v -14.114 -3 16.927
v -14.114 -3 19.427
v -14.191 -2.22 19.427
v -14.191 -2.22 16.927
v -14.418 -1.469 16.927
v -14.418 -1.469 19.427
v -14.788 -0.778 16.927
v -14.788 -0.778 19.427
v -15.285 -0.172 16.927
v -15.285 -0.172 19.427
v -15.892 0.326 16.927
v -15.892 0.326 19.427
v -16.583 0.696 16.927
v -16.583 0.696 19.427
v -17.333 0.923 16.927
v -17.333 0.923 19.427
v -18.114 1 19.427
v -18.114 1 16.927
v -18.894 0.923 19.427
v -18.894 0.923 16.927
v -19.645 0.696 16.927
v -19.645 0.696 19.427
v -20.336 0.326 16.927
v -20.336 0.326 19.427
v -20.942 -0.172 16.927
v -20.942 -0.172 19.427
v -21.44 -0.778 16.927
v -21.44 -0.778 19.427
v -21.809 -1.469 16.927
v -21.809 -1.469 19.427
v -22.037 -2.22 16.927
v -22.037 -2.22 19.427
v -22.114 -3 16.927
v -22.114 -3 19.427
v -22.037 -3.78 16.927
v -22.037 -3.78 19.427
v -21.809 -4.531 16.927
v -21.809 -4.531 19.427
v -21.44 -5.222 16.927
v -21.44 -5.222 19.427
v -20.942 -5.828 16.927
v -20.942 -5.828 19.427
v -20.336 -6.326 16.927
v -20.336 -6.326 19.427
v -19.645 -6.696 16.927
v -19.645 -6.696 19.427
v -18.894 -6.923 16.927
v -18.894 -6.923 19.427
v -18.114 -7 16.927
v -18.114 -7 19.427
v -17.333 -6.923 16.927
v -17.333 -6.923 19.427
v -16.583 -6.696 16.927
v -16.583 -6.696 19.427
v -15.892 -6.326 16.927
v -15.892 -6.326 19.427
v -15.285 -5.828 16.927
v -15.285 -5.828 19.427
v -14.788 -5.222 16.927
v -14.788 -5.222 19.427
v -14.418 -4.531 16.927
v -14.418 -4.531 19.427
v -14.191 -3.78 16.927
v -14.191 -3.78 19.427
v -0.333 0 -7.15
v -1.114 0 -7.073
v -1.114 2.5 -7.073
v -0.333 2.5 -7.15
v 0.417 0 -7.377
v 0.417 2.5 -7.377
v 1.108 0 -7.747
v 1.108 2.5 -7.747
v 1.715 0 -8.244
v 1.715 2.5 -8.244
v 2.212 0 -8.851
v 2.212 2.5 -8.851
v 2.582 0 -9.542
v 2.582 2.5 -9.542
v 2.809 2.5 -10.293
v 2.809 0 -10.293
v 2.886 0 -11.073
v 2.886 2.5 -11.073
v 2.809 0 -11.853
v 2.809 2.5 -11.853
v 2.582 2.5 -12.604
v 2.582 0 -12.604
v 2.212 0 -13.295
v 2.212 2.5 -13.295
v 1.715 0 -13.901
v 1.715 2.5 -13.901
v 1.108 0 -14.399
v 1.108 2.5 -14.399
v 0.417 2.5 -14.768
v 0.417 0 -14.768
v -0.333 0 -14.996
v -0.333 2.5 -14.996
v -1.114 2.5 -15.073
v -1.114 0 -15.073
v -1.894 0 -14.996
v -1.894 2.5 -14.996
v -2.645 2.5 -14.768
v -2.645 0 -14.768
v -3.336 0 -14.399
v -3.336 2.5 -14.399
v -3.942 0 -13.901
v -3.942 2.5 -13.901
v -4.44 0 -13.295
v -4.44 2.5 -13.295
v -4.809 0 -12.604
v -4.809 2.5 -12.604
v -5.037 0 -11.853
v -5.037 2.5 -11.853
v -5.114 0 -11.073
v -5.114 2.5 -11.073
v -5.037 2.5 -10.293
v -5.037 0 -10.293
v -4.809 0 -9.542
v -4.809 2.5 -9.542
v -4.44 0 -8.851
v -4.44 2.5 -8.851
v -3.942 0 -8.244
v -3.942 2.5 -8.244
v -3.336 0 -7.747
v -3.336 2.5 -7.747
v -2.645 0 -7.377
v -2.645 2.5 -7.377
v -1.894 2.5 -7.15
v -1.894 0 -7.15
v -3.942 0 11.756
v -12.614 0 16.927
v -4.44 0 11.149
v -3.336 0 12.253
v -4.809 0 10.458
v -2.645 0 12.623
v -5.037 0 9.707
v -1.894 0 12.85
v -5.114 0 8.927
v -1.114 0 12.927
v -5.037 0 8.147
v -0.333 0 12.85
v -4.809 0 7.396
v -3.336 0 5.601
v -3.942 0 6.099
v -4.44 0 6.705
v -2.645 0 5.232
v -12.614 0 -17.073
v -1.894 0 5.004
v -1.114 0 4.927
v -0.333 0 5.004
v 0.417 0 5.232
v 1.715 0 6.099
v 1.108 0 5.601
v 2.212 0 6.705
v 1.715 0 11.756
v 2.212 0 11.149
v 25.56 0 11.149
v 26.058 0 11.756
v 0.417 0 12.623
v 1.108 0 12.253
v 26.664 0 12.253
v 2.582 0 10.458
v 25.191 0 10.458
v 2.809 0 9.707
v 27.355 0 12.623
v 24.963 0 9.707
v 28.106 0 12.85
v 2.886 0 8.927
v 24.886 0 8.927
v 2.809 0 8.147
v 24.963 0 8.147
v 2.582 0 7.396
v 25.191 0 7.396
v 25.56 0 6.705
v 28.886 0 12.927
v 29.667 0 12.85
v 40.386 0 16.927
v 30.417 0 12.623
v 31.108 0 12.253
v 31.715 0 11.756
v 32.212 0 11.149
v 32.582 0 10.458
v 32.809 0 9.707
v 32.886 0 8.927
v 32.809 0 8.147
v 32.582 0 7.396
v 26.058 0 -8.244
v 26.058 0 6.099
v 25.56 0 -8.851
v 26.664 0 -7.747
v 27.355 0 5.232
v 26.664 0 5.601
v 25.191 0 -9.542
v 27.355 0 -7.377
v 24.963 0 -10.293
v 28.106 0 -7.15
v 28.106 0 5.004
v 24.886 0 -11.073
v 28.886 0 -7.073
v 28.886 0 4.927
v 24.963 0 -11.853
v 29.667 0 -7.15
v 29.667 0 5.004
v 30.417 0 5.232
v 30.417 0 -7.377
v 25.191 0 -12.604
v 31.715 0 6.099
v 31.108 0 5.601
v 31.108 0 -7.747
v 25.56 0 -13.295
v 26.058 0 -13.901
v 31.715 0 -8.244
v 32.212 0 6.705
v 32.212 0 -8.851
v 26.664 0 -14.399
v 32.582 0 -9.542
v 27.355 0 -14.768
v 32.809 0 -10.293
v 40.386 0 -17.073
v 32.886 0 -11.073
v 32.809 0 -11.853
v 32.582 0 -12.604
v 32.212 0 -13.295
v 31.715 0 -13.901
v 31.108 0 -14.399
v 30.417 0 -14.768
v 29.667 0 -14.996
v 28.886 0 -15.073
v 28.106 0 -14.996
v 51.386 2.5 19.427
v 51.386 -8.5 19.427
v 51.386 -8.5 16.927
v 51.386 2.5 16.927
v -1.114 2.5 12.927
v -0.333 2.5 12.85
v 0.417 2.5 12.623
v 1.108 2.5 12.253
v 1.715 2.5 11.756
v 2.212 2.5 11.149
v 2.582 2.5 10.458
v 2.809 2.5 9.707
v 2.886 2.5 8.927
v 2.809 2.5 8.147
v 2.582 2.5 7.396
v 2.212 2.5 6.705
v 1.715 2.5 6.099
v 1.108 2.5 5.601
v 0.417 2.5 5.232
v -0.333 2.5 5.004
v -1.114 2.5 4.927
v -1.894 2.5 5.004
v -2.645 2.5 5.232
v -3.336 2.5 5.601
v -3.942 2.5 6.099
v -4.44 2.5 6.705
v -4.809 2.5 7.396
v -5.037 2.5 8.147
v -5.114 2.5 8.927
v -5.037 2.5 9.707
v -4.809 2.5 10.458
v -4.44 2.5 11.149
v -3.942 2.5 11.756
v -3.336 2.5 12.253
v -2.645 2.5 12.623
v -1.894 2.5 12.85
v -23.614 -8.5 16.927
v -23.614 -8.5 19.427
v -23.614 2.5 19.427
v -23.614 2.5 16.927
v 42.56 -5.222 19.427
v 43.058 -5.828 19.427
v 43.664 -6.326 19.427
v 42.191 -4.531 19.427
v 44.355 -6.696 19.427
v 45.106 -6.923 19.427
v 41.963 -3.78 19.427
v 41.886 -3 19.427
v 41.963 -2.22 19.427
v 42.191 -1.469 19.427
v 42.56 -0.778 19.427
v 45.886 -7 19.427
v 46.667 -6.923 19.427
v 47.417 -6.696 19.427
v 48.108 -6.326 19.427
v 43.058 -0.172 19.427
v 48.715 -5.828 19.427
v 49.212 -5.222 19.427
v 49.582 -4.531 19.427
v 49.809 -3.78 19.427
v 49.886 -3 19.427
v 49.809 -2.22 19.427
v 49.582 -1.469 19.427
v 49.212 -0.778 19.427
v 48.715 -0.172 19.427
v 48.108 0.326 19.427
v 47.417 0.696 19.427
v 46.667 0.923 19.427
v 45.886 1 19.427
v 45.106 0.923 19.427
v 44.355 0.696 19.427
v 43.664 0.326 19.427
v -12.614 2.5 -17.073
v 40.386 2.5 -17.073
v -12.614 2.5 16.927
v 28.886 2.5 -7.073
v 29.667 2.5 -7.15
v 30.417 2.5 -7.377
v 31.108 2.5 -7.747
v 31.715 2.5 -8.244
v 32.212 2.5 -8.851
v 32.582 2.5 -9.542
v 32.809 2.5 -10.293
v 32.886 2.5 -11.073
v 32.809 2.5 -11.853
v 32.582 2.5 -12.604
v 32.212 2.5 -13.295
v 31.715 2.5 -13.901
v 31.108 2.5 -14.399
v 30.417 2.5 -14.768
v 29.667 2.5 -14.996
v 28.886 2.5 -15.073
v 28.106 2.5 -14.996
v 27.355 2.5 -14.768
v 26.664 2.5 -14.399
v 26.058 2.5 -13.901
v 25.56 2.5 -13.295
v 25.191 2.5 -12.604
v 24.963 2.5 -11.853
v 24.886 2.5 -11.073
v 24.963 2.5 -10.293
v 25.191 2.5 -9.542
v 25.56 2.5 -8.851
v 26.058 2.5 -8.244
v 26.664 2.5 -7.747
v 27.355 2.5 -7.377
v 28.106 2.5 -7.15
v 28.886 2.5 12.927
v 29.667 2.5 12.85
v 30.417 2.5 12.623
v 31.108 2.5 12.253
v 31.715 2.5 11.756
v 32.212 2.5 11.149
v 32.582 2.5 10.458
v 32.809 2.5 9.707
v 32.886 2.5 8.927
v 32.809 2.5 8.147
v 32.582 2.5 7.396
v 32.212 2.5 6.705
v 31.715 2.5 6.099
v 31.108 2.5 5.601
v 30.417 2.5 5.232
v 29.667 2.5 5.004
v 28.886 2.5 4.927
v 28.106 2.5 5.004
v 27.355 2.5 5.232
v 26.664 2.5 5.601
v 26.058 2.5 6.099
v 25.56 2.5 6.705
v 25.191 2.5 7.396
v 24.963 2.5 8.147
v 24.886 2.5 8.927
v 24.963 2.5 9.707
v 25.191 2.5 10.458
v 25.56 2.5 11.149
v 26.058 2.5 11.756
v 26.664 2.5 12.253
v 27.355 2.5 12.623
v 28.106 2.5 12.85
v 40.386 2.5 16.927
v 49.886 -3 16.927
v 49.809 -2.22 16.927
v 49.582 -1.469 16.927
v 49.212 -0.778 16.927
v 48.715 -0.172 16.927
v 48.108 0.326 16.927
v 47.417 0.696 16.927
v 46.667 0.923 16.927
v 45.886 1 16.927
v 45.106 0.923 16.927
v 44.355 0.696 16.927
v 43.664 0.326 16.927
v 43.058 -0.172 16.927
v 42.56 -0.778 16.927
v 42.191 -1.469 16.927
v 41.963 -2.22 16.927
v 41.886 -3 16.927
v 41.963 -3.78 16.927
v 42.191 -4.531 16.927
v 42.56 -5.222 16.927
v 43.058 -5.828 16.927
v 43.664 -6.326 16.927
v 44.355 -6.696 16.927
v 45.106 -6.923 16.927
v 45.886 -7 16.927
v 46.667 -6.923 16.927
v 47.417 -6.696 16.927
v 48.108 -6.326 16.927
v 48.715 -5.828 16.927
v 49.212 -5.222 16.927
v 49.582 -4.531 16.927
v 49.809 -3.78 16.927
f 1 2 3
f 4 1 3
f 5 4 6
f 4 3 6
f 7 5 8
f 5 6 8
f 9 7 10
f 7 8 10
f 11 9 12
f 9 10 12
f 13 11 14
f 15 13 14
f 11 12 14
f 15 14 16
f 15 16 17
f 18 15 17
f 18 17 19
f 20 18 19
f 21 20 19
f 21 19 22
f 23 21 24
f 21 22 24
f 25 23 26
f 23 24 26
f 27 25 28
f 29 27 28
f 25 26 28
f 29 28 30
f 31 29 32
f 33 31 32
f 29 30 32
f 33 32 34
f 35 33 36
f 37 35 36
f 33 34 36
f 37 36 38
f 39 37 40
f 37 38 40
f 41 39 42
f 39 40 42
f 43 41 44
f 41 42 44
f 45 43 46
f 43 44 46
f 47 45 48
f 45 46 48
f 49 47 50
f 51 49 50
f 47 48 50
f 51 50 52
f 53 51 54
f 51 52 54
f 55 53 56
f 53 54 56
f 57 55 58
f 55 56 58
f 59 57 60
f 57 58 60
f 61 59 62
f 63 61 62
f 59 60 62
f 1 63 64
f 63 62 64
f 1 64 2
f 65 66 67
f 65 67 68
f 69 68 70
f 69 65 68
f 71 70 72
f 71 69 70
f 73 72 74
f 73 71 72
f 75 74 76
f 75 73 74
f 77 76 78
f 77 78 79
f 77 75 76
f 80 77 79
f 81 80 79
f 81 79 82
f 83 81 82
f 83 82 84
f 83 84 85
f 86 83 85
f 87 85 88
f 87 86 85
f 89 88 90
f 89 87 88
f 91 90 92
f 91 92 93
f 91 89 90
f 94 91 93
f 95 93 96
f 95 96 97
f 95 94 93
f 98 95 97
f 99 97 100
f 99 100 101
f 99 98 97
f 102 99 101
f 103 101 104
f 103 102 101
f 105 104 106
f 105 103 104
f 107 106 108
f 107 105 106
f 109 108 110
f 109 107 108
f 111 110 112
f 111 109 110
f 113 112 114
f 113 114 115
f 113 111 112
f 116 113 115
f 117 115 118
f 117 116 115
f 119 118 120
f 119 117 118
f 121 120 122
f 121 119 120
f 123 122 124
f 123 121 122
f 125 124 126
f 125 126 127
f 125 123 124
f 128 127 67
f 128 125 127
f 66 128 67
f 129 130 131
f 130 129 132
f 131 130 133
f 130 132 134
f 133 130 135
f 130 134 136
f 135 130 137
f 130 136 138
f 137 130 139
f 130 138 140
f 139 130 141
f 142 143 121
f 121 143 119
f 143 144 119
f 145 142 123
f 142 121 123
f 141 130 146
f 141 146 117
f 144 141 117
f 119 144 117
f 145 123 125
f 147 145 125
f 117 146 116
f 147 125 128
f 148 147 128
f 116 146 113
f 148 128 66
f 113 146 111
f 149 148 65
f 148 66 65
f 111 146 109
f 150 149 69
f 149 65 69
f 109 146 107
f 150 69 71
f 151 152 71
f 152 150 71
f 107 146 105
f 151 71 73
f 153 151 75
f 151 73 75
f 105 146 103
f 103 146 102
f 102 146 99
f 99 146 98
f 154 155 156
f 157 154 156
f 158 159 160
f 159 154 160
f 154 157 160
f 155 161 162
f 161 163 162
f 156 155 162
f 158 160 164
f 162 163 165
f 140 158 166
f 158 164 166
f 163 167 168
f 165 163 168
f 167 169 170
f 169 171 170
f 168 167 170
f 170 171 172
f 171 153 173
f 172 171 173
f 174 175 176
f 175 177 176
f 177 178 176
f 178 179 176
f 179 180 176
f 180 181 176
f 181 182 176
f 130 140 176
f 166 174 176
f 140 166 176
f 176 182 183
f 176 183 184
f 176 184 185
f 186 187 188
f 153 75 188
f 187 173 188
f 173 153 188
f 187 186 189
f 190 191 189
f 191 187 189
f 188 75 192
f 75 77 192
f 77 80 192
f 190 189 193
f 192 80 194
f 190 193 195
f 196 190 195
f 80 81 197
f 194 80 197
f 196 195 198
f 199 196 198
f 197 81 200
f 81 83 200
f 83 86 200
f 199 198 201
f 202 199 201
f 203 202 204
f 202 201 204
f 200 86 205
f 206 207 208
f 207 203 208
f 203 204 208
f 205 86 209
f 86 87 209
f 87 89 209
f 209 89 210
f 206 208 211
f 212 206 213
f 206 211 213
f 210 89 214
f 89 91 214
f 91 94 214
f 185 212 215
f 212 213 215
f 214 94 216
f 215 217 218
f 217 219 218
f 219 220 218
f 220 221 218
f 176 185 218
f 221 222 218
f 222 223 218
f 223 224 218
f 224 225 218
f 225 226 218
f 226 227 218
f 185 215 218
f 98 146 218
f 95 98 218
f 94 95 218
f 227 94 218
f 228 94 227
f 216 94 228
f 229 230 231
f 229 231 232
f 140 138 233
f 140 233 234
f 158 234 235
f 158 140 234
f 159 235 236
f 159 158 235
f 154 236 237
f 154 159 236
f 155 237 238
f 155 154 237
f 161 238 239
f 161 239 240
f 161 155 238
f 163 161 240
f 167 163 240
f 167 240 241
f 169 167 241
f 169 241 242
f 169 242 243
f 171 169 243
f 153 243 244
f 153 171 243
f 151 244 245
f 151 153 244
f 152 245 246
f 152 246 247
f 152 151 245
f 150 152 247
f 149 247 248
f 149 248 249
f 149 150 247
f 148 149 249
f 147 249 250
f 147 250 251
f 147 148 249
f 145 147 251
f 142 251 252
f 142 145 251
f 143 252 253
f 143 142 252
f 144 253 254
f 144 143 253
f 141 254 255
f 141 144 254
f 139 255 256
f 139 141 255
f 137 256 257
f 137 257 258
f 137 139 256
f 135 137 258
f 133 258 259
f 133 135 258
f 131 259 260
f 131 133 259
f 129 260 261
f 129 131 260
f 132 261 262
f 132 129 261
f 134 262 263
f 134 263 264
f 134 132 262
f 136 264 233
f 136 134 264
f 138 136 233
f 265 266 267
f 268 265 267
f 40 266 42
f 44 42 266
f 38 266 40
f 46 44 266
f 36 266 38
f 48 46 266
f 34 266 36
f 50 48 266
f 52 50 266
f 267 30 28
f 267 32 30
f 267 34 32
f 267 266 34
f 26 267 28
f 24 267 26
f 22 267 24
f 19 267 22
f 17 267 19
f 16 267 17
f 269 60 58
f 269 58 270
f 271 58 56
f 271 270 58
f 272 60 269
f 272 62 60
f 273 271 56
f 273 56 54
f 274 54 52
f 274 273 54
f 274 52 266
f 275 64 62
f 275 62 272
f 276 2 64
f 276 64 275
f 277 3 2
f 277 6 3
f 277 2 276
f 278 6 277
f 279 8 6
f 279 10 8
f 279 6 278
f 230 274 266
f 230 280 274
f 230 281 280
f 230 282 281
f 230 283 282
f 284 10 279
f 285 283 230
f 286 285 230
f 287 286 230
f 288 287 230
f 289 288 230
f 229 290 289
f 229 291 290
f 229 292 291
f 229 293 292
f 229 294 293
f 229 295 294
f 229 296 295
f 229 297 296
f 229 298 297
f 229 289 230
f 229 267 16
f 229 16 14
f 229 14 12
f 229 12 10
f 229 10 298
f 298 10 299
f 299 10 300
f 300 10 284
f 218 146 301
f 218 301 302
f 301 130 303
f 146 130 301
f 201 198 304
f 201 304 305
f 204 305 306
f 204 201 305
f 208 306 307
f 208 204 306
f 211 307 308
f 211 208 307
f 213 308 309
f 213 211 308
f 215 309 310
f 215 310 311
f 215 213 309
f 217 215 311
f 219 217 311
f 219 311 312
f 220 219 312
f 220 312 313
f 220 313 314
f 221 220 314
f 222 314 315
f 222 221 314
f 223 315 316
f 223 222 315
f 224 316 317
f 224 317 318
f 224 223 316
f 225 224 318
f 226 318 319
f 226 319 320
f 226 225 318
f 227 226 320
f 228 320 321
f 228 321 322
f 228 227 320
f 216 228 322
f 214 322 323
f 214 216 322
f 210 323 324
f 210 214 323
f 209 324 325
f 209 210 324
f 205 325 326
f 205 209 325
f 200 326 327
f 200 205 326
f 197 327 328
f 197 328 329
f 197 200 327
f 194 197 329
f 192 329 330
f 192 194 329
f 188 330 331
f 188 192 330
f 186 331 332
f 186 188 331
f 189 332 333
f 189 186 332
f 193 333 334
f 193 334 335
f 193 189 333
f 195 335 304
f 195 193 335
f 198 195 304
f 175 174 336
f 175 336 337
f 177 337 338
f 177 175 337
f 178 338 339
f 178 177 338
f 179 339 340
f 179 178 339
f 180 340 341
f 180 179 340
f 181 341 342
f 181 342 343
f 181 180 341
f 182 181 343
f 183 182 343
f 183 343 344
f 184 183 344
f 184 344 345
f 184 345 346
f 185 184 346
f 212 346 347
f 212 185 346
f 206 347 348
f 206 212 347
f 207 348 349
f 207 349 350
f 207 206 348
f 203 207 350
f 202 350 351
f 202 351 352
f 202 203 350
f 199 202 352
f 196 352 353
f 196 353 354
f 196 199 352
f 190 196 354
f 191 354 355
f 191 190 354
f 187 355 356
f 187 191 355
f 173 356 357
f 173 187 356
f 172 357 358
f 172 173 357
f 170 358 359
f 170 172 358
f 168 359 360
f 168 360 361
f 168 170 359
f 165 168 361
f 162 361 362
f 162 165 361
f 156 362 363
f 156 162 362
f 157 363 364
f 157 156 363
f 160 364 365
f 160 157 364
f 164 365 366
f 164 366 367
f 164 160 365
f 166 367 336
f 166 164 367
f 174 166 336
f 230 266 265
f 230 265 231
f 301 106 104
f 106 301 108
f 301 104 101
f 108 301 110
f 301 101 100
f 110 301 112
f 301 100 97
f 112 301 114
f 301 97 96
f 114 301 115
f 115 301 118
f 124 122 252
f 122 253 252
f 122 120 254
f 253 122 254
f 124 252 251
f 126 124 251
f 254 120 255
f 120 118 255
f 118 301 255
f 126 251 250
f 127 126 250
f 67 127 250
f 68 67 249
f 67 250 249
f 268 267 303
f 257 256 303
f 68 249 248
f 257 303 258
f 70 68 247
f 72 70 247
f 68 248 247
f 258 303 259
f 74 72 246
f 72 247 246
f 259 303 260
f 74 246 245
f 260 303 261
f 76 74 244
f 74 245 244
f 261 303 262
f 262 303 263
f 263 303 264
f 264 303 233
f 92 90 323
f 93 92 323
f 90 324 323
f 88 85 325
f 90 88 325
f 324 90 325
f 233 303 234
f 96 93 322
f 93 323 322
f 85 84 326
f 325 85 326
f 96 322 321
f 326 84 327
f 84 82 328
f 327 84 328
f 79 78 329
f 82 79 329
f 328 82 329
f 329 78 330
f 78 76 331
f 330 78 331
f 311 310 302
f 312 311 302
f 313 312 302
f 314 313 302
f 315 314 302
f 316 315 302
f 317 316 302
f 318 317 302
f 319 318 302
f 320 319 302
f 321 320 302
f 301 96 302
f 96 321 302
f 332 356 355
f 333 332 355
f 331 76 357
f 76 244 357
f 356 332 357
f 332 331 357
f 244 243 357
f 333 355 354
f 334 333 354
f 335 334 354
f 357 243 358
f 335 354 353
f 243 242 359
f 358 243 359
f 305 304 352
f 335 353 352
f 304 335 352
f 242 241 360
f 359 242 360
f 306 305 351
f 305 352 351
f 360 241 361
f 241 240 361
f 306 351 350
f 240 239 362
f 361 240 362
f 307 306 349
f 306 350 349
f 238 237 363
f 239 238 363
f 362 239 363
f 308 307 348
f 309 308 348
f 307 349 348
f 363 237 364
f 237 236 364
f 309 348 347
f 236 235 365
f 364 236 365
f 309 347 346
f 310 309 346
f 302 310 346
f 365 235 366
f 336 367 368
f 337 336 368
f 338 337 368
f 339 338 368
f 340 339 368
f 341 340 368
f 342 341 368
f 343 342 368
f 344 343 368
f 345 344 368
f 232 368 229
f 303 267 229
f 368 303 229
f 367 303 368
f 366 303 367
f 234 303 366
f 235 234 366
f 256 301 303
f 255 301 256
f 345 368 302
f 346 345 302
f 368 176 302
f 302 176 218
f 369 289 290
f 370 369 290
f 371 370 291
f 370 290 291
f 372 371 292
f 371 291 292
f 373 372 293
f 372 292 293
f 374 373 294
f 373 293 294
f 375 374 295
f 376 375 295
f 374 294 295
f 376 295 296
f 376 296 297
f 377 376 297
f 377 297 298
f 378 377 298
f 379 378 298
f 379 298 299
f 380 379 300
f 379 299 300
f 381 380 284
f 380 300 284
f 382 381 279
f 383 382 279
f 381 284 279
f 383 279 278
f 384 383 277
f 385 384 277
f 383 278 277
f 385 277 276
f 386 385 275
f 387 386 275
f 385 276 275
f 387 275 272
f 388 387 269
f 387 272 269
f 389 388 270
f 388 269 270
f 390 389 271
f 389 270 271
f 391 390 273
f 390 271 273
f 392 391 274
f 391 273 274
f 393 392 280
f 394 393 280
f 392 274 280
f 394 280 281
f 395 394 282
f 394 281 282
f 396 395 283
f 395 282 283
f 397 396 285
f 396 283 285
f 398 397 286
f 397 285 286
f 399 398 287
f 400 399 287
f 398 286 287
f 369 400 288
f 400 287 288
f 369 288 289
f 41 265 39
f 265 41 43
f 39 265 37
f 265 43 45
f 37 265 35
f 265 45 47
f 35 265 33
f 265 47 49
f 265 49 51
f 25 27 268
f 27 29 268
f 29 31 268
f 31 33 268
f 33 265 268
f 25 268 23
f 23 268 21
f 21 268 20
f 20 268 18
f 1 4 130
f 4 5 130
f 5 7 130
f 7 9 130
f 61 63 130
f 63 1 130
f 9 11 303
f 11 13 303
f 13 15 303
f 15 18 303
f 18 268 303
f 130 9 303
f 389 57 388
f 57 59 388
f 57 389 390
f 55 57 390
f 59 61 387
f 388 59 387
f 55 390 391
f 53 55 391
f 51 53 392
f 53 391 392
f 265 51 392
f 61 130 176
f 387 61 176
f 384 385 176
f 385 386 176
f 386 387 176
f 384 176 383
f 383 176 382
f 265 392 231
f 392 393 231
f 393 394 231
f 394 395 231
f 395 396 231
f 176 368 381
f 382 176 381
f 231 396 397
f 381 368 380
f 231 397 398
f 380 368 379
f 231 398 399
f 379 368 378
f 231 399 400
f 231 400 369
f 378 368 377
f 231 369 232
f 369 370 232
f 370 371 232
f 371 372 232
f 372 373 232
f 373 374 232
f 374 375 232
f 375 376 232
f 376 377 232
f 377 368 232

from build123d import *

# Parameters (mm, degrees)
SKETCH_1_W      = 53
SKETCH_1_H      = 36.5
SKETCH_1_R      = 4
EXTRUDE_1_DEPTH = 2.5
SKETCH_2_W      = 75
SKETCH_2_H      = 11
SKETCH_2_R      = 4
EXTRUDE_2_DEPTH = 2.5


with BuildPart() as part:
    # 草图1 → 凸台-拉伸1 (new body)
    with BuildSketch(Plane(origin=(0, 0, 0), x_dir=(1, 0, 0), z_dir=(0, 1, 0))):
        with Locations((13.886189258, -1.177109974)):
            Rectangle(SKETCH_1_W, SKETCH_1_H)
        with Locations(Location((-1.113810742, 11.072890026, 0), (0, 0, 270))):
            Circle(SKETCH_1_R, mode=Mode.SUBTRACT)
        with Locations(Location((28.886189258, 11.072890026, 0), (0, 0, 270))):
            Circle(SKETCH_1_R, mode=Mode.SUBTRACT)
        with Locations(Location((28.886189258, -8.927109974, 0), (0, 0, 270))):
            Circle(SKETCH_1_R, mode=Mode.SUBTRACT)
        with Locations(Location((-1.113810742, -8.927109974, 0), (0, 0, 270))):
            Circle(SKETCH_1_R, mode=Mode.SUBTRACT)
    extrude(amount=EXTRUDE_1_DEPTH)

    # 草图2 → 凸台-拉伸2 (add)
    with BuildSketch(Plane.XY.offset(19.427109974)):
        with Locations((13.886189258, -3)):
            Rectangle(SKETCH_2_W, SKETCH_2_H)
        with Locations((-18.113810742, -3)):
            Circle(SKETCH_2_R, mode=Mode.SUBTRACT)
        with Locations((45.886189258, -3)):
            Circle(SKETCH_2_R, mode=Mode.SUBTRACT)
    extrude(amount=-EXTRUDE_2_DEPTH)


solid = part.part
